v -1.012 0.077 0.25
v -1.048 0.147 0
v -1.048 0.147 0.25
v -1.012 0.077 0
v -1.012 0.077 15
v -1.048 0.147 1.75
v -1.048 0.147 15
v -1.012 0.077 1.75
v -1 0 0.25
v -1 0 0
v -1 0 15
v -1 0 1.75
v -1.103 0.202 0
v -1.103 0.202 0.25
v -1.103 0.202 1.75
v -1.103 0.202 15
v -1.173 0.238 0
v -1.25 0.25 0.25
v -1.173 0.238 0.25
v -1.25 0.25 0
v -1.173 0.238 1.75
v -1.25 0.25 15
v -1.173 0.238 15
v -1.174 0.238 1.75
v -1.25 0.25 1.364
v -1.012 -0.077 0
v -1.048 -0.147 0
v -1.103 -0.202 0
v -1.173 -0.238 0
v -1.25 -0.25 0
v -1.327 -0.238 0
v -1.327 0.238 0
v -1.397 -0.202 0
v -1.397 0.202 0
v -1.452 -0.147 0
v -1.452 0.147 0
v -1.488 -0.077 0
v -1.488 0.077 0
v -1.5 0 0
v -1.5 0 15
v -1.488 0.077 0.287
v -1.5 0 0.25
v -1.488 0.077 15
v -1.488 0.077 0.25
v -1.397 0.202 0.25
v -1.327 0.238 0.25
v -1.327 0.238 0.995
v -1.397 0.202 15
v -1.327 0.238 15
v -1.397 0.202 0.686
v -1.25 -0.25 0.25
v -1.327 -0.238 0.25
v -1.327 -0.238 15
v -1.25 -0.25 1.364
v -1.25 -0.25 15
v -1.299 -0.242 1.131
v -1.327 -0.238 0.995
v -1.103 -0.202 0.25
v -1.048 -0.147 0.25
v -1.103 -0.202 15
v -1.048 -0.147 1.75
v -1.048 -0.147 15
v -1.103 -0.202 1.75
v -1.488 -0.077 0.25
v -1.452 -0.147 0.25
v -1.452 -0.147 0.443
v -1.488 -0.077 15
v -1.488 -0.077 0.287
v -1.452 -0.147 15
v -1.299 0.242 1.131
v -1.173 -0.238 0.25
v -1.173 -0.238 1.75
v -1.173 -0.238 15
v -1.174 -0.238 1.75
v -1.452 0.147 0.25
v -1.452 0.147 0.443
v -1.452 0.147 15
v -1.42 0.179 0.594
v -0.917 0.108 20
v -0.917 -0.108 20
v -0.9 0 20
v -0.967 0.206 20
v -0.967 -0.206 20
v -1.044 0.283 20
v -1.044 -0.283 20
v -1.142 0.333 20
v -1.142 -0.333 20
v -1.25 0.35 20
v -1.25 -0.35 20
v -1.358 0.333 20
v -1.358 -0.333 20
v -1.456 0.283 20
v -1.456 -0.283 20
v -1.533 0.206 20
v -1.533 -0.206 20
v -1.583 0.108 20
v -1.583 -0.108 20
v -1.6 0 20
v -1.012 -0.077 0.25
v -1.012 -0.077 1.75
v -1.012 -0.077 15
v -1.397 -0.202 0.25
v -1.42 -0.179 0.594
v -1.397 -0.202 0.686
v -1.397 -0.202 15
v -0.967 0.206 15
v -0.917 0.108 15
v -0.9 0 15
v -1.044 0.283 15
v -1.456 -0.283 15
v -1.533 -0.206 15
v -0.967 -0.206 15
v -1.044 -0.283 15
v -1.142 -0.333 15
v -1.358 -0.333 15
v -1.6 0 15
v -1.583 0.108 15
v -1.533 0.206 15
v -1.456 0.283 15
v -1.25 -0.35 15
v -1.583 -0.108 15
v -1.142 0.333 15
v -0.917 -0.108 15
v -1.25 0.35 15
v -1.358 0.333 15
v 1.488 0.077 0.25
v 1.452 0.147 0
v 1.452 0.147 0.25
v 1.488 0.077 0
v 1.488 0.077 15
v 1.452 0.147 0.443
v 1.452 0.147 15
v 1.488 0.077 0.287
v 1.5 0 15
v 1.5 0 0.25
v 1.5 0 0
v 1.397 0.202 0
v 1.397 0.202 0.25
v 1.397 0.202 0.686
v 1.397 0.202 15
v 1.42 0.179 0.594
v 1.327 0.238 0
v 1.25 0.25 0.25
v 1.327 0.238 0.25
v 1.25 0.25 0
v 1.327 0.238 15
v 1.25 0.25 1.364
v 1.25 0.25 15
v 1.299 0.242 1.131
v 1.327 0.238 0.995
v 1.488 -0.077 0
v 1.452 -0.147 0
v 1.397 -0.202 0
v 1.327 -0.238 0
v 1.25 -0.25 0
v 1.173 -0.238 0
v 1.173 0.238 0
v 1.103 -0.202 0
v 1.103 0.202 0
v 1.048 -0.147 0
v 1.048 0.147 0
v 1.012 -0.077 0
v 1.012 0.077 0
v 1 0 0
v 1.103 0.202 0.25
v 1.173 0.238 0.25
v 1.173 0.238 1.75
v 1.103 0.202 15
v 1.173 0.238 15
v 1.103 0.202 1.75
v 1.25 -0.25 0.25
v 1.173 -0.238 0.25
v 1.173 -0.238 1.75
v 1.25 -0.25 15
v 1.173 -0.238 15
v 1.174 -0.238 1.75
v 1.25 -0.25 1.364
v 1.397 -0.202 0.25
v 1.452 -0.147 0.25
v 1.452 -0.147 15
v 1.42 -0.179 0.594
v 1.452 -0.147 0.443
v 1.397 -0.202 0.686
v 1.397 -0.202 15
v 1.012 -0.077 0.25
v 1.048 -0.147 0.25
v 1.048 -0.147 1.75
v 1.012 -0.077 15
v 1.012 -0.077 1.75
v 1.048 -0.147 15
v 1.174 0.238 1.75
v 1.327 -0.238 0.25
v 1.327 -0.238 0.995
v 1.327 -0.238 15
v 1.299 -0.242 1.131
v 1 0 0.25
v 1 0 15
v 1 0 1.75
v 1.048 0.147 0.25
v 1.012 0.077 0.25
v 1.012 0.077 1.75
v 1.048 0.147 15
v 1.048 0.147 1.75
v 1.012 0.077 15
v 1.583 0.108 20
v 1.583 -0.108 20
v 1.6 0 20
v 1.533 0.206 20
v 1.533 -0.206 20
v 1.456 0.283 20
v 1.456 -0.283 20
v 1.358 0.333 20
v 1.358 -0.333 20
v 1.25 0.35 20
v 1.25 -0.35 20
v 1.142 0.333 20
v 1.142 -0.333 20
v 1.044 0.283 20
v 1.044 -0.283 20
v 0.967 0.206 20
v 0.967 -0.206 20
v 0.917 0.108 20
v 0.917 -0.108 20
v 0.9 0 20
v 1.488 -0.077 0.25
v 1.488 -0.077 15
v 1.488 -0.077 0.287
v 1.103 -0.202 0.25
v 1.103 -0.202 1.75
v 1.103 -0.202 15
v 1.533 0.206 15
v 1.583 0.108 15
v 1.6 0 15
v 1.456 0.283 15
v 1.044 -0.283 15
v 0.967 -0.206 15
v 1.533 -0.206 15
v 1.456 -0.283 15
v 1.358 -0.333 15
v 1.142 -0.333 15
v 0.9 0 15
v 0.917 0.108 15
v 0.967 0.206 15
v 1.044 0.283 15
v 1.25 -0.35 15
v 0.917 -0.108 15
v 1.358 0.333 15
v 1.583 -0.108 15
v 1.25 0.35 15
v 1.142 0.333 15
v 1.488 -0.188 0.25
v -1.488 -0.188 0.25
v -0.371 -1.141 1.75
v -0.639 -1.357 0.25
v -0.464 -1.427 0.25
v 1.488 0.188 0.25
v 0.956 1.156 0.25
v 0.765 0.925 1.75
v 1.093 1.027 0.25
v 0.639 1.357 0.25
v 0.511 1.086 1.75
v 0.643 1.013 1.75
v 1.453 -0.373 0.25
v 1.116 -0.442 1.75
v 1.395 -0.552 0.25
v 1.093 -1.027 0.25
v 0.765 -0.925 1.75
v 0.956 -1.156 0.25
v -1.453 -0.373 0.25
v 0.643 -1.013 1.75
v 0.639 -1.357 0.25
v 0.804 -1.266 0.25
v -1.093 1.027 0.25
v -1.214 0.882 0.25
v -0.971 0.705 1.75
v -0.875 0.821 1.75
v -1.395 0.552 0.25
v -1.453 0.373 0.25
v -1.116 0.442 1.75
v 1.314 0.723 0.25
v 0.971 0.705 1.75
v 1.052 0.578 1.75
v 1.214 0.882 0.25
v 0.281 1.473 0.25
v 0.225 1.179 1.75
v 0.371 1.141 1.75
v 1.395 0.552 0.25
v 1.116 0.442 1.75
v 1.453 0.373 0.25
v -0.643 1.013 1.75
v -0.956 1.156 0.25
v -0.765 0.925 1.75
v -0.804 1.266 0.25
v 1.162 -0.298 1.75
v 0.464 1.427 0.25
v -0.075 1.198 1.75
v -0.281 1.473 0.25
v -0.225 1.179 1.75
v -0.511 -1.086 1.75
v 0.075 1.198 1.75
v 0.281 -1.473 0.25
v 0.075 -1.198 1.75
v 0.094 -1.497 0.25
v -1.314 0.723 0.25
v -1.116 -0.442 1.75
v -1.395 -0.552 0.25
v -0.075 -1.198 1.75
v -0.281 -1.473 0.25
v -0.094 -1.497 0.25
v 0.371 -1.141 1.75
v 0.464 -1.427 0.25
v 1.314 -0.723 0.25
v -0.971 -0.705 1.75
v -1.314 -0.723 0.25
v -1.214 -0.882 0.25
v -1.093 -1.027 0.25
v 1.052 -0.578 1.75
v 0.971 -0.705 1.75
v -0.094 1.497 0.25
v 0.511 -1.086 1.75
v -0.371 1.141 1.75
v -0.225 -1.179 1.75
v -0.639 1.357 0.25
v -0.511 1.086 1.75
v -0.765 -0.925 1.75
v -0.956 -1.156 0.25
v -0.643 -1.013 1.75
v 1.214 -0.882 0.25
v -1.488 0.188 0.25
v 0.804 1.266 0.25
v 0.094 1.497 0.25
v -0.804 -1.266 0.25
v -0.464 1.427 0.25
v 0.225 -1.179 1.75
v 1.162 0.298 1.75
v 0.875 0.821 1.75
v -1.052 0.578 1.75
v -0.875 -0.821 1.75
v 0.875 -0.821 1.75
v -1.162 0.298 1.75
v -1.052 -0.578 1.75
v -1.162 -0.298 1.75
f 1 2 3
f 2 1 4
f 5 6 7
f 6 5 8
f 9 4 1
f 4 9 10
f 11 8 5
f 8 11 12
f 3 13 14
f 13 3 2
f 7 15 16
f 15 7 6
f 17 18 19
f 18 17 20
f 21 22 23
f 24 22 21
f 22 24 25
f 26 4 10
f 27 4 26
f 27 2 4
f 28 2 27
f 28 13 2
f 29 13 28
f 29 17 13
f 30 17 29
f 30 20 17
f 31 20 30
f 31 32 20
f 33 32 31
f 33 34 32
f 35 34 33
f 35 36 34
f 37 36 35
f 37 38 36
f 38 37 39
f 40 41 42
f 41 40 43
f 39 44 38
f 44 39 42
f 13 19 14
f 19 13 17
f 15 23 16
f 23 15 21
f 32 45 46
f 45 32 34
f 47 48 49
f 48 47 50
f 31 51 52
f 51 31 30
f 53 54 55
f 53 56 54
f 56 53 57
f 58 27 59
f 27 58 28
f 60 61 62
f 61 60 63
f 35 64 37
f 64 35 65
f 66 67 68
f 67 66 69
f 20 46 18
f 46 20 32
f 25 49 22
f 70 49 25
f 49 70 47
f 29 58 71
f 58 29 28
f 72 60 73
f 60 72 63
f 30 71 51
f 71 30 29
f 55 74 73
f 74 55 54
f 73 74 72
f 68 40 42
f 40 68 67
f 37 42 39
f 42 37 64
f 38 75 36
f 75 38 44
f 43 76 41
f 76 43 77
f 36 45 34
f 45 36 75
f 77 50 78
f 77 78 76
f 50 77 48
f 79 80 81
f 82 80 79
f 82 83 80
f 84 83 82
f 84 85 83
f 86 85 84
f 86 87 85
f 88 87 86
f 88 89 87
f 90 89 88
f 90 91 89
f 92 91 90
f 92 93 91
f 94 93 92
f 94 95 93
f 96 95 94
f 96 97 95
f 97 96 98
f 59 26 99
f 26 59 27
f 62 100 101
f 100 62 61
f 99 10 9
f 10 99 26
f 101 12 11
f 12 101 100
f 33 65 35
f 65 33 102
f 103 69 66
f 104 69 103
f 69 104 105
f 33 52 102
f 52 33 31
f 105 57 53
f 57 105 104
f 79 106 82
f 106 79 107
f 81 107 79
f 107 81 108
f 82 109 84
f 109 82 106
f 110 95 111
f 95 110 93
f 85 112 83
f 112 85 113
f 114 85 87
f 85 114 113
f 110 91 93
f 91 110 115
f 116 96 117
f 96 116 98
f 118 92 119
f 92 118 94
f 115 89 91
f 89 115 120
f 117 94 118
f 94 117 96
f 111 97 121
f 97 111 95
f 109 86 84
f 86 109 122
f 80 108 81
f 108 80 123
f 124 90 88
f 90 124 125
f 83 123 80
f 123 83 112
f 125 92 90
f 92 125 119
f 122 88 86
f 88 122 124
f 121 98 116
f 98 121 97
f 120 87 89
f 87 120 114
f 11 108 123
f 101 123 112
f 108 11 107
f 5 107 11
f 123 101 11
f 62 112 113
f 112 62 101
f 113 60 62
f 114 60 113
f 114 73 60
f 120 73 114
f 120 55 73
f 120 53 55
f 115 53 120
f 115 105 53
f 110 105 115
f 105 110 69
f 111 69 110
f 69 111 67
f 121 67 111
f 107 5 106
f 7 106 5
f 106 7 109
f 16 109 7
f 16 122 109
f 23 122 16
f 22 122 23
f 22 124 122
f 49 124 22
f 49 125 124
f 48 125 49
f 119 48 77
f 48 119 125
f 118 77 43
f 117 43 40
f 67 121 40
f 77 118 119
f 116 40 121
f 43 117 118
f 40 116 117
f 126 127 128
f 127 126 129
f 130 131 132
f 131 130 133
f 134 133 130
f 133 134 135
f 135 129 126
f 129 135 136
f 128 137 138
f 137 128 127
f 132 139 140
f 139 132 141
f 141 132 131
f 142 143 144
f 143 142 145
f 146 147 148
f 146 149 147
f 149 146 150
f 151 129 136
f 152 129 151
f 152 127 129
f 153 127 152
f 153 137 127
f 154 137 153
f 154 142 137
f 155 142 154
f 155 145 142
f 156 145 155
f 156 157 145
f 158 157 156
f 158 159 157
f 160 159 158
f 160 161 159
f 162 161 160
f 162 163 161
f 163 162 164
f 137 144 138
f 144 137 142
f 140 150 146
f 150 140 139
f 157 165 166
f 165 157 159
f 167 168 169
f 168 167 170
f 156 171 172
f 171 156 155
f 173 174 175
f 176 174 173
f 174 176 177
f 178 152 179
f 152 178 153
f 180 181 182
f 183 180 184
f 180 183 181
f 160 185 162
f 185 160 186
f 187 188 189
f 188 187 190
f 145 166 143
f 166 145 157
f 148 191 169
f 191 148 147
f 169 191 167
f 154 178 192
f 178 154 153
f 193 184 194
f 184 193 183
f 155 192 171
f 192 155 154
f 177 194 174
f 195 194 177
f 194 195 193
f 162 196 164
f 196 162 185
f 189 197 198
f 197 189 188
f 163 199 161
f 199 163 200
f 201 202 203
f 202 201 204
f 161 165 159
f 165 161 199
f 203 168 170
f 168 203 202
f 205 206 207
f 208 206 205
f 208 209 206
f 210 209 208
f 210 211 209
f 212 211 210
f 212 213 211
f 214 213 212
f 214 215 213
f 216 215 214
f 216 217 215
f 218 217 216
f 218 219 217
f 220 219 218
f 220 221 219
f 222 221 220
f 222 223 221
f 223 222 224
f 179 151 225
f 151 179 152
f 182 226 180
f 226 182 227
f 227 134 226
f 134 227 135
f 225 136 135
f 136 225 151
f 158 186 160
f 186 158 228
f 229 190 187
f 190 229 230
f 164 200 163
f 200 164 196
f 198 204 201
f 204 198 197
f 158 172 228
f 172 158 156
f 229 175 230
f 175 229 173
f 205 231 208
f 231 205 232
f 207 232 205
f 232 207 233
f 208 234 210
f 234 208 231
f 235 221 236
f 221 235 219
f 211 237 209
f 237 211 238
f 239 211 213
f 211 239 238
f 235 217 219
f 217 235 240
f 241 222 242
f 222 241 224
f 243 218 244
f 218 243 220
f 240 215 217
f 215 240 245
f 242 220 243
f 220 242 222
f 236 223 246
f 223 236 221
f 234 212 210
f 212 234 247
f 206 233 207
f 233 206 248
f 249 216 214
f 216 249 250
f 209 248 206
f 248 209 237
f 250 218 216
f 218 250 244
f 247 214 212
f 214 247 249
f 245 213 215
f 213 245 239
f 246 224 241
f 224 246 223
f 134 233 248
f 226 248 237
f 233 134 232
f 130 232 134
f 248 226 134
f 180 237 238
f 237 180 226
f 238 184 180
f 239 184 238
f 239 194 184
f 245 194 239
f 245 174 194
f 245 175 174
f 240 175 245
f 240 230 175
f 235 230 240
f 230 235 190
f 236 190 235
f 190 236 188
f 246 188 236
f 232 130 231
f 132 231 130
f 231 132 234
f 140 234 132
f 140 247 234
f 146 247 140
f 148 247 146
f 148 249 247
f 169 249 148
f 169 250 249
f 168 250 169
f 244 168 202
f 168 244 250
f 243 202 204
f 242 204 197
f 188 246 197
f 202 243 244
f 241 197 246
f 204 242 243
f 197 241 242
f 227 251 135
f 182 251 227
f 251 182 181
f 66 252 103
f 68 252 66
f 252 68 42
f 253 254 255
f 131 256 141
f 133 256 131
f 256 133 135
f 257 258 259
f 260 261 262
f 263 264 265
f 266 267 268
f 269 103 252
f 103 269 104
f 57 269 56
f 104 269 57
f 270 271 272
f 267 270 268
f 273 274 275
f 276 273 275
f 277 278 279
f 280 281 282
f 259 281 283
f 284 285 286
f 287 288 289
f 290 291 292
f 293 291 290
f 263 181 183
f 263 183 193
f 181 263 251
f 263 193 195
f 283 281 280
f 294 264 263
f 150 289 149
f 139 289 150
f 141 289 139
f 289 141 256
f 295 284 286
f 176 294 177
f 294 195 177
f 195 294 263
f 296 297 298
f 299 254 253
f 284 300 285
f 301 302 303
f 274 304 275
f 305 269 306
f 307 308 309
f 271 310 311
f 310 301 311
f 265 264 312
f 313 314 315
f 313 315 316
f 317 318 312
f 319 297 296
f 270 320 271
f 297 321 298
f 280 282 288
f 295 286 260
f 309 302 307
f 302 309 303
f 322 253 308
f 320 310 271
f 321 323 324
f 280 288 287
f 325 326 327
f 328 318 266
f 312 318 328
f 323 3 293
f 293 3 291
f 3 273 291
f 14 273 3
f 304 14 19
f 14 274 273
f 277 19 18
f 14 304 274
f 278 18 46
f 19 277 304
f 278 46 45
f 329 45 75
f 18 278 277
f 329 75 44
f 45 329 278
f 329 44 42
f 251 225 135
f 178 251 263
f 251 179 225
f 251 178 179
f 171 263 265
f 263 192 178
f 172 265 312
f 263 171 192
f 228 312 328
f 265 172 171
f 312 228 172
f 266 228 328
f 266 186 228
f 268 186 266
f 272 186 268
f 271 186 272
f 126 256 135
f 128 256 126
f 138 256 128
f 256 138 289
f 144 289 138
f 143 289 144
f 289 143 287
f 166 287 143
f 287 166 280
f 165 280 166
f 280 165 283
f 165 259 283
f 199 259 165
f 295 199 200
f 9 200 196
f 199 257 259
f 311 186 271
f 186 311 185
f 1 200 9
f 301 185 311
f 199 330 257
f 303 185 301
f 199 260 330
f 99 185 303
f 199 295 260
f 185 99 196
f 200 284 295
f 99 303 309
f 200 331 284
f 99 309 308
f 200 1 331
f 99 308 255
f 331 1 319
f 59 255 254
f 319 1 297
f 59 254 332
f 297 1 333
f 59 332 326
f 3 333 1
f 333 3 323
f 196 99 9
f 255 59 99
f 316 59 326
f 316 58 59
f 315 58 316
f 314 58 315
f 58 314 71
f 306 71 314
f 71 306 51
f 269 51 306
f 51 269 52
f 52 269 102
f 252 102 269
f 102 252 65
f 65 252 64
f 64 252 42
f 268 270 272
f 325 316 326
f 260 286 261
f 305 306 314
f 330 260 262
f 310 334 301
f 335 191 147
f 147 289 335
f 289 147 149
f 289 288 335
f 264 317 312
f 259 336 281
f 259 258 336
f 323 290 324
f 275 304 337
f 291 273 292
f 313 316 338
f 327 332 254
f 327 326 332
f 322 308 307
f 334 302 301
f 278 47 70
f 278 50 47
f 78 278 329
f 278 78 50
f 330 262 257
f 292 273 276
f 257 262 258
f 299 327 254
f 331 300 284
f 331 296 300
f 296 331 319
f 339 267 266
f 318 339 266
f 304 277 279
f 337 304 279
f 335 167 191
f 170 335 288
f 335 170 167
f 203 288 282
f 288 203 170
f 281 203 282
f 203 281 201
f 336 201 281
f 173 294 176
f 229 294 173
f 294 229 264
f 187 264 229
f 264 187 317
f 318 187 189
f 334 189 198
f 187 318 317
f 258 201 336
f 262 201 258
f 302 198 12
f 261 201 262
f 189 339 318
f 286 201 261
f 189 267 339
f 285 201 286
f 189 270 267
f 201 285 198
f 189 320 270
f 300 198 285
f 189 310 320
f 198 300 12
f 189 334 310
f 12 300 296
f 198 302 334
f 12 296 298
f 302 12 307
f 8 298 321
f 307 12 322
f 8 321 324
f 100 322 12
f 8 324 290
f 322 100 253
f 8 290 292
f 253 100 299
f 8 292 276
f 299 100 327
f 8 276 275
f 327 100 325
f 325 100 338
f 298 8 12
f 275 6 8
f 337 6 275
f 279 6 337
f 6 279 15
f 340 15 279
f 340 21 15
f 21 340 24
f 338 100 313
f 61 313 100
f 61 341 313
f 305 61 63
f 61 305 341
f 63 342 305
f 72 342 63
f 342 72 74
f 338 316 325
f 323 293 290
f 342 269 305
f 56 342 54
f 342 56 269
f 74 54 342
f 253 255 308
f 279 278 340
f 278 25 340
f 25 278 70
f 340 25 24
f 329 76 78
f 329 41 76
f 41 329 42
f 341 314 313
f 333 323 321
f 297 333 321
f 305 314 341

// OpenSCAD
// Parameters
thermistor_diameter = 3; // Diameter of the thermistor body in mm
thermistor_thickness = 1.5; // Thickness of the thermistor body in mm
lead_diameter = 0.5; // Diameter of the leads in mm
lead_length = 20; // Length of the leads in mm
lead_spacing = 2.5; // Spacing between the leads in mm
fillet_radius = 0.3; // Fillet radius for the body edges in mm

// Thermistor body
module thermistor_body() {
    translate([0, 0, lead_diameter/2])
        cylinder(h = thermistor_thickness, d = thermistor_diameter, $fn=50);
}

// Lead
module lead() {
    cylinder(h = lead_length, d = lead_diameter, $fn=20);
}

// Lead bend region
module lead_bend_region() {
    translate([0, 0, lead_length - 5])
        cylinder(h = 5, d = lead_diameter + 0.2, $fn=20);
}

// Lead tinning tip detail
module lead_tinning_tip_detail() {
    translate([0, 0, lead_length - 1])
        cylinder(h = 1, d = lead_diameter + 0.1, $fn=20);
}

// Small body fillet
module small_body_fillet() {
    translate([0, 0, lead_diameter/2])
        cylinder(h = thermistor_thickness, d1 = thermistor_diameter, d2 = thermistor_diameter - 2*fillet_radius, $fn=50);
}

// Body marking (simplified as a small indentation)
module body_marking() {
    translate([0, 0, lead_diameter/2 + thermistor_thickness/2])
        cylinder(h = 0.1, d = thermistor_diameter - 1, $fn=50);
}

// Complete thermistor model
module thermistor() {
    // Thermistor body with fillet
    small_body_fillet();
    // Body marking
    body_marking();
    // Leads
    translate([-lead_spacing/2, 0, 0]) {
        lead();
        lead_bend_region();
        lead_tinning_tip_detail();
    }
    translate([lead_spacing/2, 0, 0]) {
        lead();
        lead_bend_region();
        lead_tinning_tip_detail();
    }
}

// Render the thermistor
thermistor();
